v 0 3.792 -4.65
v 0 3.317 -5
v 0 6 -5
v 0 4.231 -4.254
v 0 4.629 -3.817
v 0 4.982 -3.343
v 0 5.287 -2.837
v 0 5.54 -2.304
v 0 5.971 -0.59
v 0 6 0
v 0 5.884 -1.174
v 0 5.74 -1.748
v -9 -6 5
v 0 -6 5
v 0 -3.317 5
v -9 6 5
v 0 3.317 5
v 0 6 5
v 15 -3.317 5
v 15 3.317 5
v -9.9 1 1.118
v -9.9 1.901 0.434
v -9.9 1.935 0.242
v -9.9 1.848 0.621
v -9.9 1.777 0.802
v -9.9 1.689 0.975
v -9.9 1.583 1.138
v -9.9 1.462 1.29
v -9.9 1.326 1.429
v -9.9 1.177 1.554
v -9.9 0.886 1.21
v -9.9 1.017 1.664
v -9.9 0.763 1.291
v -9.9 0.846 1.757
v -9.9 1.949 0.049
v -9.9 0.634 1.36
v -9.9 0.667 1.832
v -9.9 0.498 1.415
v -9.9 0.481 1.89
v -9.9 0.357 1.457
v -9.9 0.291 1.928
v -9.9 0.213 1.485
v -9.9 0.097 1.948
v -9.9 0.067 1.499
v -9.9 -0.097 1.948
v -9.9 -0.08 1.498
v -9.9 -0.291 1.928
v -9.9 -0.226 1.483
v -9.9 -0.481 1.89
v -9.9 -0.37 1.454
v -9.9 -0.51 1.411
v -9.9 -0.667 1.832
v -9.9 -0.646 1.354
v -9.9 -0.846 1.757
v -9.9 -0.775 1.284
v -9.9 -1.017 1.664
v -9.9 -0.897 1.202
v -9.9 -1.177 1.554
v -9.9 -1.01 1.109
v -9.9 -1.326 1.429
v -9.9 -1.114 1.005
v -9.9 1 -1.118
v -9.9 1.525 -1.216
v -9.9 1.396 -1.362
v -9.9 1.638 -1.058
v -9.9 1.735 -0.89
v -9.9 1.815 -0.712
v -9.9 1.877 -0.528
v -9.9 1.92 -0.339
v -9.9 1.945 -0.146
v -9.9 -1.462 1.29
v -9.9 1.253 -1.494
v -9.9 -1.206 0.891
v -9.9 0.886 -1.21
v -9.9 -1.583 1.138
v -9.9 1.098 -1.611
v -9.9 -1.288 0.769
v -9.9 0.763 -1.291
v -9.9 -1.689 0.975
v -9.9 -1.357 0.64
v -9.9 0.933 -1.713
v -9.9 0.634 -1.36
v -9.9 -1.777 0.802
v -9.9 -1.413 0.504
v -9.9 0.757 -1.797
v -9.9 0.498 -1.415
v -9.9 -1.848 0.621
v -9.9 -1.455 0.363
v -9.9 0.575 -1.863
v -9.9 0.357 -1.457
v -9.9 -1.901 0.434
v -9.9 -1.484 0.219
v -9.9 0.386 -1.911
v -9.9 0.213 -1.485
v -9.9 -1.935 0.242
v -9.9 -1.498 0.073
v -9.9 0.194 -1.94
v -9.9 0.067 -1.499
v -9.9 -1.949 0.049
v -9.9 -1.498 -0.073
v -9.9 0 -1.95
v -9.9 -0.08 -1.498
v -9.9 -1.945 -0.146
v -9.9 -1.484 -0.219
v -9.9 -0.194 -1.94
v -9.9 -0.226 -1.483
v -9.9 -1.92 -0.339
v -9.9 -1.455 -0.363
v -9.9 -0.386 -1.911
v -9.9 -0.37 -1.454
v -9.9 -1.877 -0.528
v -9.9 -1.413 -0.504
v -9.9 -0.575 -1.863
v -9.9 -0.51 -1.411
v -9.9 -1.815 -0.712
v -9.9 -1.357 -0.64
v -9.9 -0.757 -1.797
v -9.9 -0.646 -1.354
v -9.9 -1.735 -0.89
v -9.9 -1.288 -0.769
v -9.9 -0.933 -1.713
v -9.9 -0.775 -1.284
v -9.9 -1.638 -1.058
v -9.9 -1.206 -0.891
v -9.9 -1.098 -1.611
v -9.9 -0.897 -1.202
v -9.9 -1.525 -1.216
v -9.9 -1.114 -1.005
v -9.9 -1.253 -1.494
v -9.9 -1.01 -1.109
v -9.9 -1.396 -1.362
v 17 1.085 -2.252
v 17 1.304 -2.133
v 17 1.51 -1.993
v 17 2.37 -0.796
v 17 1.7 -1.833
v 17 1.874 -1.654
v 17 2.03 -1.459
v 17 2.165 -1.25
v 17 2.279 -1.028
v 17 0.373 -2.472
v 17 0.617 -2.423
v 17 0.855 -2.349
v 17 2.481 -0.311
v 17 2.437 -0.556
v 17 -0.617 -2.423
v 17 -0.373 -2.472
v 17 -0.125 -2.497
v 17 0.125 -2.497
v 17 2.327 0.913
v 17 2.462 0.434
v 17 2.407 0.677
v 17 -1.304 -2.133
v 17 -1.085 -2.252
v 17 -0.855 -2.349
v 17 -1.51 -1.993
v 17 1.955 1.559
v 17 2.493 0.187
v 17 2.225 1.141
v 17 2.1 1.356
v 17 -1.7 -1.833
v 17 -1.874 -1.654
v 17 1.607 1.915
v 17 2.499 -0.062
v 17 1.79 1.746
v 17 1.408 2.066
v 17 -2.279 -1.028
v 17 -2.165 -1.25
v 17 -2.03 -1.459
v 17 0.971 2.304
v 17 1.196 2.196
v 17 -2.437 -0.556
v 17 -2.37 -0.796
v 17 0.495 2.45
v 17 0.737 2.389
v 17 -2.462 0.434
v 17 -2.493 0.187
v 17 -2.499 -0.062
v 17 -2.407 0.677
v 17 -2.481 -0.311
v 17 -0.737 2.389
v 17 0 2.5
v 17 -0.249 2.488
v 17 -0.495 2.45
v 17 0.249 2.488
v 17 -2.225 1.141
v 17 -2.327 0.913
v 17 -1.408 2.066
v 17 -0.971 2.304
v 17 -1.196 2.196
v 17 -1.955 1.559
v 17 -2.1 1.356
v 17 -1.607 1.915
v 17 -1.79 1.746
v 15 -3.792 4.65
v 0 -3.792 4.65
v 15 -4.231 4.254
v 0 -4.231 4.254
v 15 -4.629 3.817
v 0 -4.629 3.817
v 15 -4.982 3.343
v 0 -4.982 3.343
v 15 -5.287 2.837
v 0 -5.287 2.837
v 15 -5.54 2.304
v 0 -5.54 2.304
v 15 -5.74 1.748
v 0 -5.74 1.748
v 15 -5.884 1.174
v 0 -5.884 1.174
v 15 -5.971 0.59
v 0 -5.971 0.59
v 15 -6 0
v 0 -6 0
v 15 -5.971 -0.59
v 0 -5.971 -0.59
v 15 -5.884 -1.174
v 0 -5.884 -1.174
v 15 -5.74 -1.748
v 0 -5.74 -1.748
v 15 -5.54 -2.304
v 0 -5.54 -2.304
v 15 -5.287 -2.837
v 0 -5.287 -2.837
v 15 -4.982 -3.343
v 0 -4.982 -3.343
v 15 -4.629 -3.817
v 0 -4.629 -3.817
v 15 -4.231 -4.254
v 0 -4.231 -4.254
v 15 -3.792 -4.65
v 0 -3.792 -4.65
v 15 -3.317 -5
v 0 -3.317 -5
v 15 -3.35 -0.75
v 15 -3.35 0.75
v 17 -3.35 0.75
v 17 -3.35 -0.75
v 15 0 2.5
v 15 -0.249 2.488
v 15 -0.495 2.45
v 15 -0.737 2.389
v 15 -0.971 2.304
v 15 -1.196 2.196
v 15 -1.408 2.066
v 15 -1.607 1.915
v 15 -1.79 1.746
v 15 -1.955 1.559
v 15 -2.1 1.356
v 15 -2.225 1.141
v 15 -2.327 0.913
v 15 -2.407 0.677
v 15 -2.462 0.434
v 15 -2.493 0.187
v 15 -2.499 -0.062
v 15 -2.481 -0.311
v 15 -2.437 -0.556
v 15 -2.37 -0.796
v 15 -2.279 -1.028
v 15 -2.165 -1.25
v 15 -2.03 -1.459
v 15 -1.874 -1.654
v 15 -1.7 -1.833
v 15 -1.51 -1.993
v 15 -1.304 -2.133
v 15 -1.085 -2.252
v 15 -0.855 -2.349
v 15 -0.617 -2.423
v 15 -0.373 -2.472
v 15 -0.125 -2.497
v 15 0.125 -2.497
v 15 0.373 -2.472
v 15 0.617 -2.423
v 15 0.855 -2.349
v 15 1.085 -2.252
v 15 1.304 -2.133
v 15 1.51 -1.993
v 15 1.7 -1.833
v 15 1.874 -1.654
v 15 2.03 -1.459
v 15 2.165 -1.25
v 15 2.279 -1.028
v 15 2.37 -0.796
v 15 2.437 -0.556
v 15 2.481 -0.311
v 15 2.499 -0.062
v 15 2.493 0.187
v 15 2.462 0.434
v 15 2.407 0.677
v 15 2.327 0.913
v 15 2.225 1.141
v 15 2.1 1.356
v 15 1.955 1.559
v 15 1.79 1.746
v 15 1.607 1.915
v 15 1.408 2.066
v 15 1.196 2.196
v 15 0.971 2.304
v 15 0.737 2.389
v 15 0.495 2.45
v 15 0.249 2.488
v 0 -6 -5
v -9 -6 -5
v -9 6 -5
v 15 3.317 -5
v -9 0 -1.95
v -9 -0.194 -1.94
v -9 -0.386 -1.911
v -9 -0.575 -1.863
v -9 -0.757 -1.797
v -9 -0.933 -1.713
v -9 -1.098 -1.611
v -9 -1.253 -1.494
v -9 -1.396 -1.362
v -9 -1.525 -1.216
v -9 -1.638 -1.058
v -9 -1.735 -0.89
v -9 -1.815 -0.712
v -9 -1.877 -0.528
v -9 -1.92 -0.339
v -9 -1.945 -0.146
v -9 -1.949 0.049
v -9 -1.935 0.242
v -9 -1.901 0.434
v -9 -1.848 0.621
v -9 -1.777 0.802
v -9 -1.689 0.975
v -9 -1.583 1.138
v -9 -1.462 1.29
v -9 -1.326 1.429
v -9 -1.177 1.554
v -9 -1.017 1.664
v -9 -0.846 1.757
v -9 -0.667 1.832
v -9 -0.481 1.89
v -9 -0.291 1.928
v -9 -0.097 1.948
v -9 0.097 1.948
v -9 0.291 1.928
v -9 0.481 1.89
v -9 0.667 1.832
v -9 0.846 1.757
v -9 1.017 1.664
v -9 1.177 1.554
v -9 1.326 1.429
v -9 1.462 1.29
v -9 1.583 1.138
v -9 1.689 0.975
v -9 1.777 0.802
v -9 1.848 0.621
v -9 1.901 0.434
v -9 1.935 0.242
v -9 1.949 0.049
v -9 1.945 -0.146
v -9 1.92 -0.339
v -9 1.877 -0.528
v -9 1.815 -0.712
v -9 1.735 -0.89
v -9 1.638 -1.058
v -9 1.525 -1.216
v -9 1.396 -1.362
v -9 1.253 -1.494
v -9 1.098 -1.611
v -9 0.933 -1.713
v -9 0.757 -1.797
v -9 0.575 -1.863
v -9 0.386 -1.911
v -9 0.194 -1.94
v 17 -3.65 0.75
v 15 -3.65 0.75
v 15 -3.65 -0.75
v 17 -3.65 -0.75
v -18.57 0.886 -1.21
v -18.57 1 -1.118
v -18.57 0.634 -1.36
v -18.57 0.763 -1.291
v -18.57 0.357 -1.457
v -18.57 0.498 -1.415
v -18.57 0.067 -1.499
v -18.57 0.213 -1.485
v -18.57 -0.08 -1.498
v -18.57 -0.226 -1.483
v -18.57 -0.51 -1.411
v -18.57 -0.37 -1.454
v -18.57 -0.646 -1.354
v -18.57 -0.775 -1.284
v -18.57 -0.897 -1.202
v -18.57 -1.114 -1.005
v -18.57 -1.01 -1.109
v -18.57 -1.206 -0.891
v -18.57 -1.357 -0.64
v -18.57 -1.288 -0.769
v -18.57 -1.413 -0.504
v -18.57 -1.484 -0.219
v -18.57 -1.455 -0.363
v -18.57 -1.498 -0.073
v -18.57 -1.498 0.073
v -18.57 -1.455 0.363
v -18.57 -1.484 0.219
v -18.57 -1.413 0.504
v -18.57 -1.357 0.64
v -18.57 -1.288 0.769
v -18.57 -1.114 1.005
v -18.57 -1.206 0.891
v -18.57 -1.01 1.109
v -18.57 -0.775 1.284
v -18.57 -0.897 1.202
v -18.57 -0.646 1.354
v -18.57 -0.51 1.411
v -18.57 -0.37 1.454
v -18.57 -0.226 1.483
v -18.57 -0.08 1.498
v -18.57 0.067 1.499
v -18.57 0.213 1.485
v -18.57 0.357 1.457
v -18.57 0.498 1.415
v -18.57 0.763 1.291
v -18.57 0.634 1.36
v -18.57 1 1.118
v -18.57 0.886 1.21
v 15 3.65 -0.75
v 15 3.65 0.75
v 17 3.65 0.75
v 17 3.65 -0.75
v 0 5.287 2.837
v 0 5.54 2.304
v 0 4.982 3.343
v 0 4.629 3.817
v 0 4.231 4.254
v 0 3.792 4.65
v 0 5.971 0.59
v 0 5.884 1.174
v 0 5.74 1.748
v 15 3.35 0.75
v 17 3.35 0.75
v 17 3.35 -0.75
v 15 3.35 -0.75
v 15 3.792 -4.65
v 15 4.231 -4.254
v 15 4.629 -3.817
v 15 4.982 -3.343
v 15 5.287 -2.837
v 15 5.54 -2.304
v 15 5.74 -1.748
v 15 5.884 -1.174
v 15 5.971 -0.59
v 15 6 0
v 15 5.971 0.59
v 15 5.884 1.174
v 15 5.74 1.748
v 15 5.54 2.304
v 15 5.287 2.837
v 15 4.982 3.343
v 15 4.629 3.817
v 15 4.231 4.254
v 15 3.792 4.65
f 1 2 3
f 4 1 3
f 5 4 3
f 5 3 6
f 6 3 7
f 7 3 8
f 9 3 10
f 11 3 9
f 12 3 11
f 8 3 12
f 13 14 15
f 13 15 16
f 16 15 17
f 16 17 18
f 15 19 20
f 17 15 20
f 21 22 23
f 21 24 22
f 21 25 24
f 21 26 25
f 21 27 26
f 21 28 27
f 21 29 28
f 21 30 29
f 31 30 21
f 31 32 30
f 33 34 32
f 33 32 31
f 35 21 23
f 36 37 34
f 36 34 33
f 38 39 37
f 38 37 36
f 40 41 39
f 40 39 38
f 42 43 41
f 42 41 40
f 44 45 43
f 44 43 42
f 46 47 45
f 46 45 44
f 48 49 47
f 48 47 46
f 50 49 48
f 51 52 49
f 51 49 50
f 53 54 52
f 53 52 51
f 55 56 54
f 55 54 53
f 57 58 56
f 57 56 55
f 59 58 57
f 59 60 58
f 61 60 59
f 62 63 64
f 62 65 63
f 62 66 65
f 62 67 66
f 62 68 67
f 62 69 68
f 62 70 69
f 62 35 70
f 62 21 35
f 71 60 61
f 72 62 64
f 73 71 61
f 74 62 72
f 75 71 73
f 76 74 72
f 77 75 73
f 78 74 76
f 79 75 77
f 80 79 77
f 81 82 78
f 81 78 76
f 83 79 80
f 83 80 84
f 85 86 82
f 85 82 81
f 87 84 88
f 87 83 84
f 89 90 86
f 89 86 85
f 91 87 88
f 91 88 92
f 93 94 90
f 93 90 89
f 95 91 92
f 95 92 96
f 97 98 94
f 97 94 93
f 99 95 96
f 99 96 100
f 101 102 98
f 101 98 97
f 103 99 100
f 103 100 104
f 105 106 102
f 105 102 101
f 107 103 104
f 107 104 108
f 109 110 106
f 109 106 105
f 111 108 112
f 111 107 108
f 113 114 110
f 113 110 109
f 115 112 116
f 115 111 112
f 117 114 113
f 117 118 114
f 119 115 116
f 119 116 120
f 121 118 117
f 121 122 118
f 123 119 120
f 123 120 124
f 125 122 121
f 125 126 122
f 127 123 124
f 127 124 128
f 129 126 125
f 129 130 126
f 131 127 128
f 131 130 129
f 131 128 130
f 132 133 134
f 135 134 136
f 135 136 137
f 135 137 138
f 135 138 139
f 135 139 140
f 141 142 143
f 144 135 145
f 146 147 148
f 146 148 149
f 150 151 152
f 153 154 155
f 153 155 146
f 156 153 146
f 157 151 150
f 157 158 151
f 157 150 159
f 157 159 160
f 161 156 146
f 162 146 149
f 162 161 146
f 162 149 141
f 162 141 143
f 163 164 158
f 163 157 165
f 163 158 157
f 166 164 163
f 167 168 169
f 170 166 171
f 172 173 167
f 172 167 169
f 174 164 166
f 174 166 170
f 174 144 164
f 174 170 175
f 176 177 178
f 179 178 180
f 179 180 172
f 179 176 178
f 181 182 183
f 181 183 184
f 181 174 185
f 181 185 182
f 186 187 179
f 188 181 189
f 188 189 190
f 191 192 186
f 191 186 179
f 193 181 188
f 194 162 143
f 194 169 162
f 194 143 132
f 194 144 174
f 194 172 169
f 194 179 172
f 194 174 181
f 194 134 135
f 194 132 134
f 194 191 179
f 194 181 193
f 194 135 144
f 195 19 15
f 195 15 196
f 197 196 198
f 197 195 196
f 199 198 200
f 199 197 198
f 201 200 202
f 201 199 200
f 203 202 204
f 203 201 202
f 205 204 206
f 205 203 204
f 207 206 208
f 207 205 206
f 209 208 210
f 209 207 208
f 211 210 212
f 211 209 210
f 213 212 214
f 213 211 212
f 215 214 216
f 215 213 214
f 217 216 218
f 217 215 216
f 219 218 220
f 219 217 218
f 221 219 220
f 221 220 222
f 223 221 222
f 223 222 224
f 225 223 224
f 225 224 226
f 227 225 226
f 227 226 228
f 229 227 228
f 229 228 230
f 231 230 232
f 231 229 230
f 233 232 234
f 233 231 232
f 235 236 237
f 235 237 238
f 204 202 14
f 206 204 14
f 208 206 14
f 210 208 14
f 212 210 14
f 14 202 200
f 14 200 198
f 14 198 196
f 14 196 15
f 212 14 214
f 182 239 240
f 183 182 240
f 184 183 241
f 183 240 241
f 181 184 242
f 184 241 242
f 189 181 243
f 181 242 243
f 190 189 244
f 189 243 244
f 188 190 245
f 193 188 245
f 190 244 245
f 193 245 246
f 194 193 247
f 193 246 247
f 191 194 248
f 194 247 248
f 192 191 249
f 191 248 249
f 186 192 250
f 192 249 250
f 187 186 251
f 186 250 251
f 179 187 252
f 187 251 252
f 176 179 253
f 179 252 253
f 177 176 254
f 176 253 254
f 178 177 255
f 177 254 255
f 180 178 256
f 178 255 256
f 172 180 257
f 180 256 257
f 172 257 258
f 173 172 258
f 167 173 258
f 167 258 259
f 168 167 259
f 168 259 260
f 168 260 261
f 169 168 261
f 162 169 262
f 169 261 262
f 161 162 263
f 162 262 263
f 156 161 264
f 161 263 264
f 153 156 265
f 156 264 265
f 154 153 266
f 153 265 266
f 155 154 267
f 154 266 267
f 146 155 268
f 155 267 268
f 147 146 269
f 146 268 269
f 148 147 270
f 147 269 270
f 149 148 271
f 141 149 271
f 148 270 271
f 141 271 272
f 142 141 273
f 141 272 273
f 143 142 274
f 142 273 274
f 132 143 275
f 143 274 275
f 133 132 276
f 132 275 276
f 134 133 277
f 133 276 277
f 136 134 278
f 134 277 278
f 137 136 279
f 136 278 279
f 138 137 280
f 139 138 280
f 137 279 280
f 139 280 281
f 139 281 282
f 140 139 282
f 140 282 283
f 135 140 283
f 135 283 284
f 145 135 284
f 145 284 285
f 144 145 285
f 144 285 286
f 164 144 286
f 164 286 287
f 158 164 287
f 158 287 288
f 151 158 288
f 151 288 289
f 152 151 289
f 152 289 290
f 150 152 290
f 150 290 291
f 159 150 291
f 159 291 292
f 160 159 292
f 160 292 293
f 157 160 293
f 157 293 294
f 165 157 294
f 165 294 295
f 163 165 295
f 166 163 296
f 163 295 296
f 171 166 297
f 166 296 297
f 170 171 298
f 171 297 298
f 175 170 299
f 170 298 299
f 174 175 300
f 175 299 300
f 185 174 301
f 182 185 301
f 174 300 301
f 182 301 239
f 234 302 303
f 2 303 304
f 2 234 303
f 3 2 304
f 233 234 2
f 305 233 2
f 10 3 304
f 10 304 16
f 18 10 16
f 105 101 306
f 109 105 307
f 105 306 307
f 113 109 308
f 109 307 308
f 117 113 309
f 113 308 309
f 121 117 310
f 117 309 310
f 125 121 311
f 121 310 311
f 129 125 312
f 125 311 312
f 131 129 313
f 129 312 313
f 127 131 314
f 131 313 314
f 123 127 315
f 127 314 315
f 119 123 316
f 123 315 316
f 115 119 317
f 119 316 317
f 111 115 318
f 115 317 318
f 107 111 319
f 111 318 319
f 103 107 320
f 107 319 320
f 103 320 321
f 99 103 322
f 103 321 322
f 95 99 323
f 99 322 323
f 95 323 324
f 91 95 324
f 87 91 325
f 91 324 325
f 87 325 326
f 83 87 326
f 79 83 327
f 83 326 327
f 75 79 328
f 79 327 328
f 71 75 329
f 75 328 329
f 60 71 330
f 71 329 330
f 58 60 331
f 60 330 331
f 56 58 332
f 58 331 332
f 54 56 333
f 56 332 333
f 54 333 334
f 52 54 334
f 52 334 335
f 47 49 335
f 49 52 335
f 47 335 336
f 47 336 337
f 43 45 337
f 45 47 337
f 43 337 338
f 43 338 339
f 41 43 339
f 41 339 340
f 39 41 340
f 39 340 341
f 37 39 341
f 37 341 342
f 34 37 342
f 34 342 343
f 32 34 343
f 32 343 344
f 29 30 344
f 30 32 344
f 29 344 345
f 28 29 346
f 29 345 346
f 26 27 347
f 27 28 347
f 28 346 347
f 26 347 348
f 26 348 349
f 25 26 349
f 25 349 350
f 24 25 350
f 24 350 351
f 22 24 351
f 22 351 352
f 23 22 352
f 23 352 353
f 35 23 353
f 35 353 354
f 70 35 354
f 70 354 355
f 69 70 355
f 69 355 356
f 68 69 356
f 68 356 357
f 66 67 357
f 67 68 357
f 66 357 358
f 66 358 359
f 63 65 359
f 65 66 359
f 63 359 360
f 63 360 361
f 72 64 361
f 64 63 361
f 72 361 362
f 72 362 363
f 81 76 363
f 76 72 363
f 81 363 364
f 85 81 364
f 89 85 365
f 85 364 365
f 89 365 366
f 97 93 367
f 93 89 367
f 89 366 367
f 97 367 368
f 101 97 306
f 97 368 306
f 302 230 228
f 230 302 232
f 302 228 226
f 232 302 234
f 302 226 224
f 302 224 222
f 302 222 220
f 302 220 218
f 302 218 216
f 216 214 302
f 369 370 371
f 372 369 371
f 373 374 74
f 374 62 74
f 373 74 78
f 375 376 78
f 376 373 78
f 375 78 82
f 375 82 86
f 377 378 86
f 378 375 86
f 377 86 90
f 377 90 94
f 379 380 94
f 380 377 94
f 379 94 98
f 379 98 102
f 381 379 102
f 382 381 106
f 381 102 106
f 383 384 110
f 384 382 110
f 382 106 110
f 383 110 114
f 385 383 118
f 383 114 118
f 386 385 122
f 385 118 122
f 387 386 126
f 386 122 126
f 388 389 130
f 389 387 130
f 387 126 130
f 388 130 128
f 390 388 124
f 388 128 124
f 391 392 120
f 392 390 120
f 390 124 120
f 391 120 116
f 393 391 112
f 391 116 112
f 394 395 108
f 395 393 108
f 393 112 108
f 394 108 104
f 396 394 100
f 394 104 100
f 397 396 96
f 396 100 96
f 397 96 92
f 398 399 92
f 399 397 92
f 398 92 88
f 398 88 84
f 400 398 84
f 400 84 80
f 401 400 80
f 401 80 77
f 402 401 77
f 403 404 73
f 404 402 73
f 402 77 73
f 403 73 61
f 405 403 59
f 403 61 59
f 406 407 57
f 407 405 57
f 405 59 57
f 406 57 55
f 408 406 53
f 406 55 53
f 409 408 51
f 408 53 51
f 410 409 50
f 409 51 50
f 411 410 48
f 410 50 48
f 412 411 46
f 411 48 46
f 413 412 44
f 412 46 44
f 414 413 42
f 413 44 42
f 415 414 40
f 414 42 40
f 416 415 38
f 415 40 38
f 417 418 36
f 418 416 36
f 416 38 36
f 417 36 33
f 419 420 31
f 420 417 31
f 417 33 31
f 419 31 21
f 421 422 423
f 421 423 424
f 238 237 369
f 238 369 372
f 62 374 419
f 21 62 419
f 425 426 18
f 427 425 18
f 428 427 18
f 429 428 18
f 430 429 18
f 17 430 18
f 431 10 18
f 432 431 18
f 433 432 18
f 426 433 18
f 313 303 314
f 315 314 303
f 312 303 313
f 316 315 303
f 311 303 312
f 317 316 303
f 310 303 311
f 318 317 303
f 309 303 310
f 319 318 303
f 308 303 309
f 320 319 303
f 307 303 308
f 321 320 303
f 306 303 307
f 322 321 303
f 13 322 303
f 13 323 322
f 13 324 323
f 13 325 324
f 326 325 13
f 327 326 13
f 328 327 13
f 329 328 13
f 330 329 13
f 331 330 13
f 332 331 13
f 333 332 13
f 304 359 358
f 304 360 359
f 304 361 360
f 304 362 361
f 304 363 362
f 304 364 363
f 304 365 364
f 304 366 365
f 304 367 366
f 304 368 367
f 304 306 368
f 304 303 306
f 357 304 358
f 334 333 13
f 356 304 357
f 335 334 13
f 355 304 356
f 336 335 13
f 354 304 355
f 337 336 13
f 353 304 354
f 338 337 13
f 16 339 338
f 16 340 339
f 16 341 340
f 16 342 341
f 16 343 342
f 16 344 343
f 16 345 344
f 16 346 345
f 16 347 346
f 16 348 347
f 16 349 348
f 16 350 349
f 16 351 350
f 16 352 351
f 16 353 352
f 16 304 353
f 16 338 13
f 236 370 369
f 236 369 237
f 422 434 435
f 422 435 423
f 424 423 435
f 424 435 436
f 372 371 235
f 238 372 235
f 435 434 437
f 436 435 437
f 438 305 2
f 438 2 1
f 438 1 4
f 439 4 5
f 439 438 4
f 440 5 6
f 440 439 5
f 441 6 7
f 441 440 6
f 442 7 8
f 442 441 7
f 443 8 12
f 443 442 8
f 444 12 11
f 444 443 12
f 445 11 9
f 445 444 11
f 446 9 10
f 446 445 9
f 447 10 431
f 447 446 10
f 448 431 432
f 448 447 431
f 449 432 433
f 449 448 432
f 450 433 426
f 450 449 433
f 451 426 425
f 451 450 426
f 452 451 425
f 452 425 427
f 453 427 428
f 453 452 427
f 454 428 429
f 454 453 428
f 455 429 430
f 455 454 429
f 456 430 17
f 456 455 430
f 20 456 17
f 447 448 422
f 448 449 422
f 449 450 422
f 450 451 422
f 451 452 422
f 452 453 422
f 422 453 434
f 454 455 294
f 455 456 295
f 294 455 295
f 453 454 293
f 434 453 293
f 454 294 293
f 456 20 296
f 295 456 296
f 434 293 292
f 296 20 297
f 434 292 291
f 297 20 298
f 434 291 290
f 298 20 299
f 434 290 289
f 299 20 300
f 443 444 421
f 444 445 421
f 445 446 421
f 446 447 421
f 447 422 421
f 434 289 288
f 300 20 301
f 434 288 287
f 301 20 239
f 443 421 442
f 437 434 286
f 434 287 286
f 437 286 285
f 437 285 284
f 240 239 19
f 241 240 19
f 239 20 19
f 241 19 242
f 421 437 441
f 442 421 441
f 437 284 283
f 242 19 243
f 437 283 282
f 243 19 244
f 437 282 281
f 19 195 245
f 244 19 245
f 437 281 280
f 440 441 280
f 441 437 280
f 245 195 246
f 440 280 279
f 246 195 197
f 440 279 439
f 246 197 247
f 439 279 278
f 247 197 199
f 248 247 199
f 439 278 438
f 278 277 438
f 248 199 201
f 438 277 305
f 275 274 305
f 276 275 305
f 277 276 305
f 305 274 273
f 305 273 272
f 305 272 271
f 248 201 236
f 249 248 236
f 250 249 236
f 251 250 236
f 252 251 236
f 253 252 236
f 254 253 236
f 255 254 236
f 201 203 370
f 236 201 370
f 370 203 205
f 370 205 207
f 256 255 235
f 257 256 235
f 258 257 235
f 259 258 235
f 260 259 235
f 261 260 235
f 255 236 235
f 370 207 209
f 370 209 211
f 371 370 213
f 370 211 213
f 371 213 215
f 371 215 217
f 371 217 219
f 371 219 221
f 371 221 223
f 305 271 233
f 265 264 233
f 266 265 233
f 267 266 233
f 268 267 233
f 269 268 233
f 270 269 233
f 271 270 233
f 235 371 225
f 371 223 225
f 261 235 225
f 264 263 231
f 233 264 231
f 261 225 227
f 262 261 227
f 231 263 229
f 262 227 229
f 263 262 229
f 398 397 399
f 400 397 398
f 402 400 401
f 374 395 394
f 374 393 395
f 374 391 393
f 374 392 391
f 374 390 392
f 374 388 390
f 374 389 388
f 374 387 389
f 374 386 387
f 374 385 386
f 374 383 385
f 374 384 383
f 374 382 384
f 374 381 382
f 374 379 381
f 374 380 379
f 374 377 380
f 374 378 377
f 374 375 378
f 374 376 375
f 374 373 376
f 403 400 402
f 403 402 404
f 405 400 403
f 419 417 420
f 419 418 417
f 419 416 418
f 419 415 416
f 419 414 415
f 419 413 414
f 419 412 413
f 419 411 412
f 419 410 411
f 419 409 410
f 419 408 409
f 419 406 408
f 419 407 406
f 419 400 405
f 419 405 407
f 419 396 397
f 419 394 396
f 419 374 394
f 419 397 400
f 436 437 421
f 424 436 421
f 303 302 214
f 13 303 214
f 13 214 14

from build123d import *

# Parameters (mm, degrees)
SKETCH6_W           = 15
SKETCH6_H           = 6
SKETCH8_W           = 10
SKETCH8_H           = 12
BOSS_EXTRUDE2_DEPTH = 9
SKETCH9_W           = 1
SKETCH9_H           = 12
CUT_EXTRUDE2_DEPTH  = 15
SKETCH10_R          = 1.95
BOSS_EXTRUDE3_DEPTH = 0.9
SKETCH11_R          = 1.5
BOSS_EXTRUDE4_DEPTH = 8.67
SKETCH12_W          = 2.491987158
SKETCH12_H          = 0.5
CUT_EXTRUDE3_DEPTH  = 8.67
SKETCH13_R          = 2.5
SKETCH13_W          = 1.5
SKETCH13_H          = 0.3
BOSS_EXTRUDE5_DEPTH = 2


with BuildPart() as part:
    # Sketch6 → Revolve-Thin2 (revolve)
    with BuildSketch(Plane(origin=(0, 0, 0), x_dir=(1, 0, 0), z_dir=(0, 1, 0)), mode=Mode.PRIVATE) as revolve_thin2_sk:
        with Locations((7.5, 3)):
            Rectangle(SKETCH6_W, SKETCH6_H)
    revolve(revolve_thin2_sk.sketch.rotate(Axis((0, 0, 0), (1, 0, 0)), 180), axis=Axis((0, 0, 0), (1, 0, 0)))

    # Sketch8 → Boss-Extrude2 (add)
    with BuildSketch(Plane.ZY):
        Rectangle(SKETCH8_W, SKETCH8_H)
    extrude(amount=BOSS_EXTRUDE2_DEPTH)

    # Sketch9 → Cut-Extrude2 (cut)
    with BuildSketch(Plane.ZY):
        with Locations((5.5, 0)):
            Rectangle(SKETCH9_W, SKETCH9_H)
        with Locations((-5.5, 0)):
            Rectangle(SKETCH9_W, SKETCH9_H)
    extrude(amount=-CUT_EXTRUDE2_DEPTH, mode=Mode.SUBTRACT)

    # Sketch10 → Boss-Extrude3 (add)
    with BuildSketch(Plane.ZY.offset(9)):
        with Locations(Location((0, 0, 0), (0, 0, 180))):
            Circle(SKETCH10_R)
    extrude(amount=BOSS_EXTRUDE3_DEPTH)

    # Sketch11 → Boss-Extrude4 (add)
    with BuildSketch(Plane.ZY.offset(9.9)):
        Circle(SKETCH11_R)
    extrude(amount=BOSS_EXTRUDE4_DEPTH)

    # Sketch12 → Cut-Extrude3 (cut)
    with BuildSketch(Plane.ZY.offset(18.57)):
        with Locations((0, 1.25)):
            Rectangle(SKETCH12_W, SKETCH12_H)
    extrude(amount=-CUT_EXTRUDE3_DEPTH, mode=Mode.SUBTRACT)

    # Sketch13 → Boss-Extrude5 (add)
    with BuildSketch(Plane(origin=(15, 0, 0), x_dir=(0, 0, -1), z_dir=(1, 0, 0))):
        with Locations(Location((0, 0, 0), (0, 0, 180))):
            Circle(SKETCH13_R)
        with Locations((0, 3.5)):
            Rectangle(SKETCH13_W, SKETCH13_H)
        with Locations((0, -3.5)):
            Rectangle(SKETCH13_W, SKETCH13_H)
    extrude(amount=BOSS_EXTRUDE5_DEPTH)


solid = part.part
